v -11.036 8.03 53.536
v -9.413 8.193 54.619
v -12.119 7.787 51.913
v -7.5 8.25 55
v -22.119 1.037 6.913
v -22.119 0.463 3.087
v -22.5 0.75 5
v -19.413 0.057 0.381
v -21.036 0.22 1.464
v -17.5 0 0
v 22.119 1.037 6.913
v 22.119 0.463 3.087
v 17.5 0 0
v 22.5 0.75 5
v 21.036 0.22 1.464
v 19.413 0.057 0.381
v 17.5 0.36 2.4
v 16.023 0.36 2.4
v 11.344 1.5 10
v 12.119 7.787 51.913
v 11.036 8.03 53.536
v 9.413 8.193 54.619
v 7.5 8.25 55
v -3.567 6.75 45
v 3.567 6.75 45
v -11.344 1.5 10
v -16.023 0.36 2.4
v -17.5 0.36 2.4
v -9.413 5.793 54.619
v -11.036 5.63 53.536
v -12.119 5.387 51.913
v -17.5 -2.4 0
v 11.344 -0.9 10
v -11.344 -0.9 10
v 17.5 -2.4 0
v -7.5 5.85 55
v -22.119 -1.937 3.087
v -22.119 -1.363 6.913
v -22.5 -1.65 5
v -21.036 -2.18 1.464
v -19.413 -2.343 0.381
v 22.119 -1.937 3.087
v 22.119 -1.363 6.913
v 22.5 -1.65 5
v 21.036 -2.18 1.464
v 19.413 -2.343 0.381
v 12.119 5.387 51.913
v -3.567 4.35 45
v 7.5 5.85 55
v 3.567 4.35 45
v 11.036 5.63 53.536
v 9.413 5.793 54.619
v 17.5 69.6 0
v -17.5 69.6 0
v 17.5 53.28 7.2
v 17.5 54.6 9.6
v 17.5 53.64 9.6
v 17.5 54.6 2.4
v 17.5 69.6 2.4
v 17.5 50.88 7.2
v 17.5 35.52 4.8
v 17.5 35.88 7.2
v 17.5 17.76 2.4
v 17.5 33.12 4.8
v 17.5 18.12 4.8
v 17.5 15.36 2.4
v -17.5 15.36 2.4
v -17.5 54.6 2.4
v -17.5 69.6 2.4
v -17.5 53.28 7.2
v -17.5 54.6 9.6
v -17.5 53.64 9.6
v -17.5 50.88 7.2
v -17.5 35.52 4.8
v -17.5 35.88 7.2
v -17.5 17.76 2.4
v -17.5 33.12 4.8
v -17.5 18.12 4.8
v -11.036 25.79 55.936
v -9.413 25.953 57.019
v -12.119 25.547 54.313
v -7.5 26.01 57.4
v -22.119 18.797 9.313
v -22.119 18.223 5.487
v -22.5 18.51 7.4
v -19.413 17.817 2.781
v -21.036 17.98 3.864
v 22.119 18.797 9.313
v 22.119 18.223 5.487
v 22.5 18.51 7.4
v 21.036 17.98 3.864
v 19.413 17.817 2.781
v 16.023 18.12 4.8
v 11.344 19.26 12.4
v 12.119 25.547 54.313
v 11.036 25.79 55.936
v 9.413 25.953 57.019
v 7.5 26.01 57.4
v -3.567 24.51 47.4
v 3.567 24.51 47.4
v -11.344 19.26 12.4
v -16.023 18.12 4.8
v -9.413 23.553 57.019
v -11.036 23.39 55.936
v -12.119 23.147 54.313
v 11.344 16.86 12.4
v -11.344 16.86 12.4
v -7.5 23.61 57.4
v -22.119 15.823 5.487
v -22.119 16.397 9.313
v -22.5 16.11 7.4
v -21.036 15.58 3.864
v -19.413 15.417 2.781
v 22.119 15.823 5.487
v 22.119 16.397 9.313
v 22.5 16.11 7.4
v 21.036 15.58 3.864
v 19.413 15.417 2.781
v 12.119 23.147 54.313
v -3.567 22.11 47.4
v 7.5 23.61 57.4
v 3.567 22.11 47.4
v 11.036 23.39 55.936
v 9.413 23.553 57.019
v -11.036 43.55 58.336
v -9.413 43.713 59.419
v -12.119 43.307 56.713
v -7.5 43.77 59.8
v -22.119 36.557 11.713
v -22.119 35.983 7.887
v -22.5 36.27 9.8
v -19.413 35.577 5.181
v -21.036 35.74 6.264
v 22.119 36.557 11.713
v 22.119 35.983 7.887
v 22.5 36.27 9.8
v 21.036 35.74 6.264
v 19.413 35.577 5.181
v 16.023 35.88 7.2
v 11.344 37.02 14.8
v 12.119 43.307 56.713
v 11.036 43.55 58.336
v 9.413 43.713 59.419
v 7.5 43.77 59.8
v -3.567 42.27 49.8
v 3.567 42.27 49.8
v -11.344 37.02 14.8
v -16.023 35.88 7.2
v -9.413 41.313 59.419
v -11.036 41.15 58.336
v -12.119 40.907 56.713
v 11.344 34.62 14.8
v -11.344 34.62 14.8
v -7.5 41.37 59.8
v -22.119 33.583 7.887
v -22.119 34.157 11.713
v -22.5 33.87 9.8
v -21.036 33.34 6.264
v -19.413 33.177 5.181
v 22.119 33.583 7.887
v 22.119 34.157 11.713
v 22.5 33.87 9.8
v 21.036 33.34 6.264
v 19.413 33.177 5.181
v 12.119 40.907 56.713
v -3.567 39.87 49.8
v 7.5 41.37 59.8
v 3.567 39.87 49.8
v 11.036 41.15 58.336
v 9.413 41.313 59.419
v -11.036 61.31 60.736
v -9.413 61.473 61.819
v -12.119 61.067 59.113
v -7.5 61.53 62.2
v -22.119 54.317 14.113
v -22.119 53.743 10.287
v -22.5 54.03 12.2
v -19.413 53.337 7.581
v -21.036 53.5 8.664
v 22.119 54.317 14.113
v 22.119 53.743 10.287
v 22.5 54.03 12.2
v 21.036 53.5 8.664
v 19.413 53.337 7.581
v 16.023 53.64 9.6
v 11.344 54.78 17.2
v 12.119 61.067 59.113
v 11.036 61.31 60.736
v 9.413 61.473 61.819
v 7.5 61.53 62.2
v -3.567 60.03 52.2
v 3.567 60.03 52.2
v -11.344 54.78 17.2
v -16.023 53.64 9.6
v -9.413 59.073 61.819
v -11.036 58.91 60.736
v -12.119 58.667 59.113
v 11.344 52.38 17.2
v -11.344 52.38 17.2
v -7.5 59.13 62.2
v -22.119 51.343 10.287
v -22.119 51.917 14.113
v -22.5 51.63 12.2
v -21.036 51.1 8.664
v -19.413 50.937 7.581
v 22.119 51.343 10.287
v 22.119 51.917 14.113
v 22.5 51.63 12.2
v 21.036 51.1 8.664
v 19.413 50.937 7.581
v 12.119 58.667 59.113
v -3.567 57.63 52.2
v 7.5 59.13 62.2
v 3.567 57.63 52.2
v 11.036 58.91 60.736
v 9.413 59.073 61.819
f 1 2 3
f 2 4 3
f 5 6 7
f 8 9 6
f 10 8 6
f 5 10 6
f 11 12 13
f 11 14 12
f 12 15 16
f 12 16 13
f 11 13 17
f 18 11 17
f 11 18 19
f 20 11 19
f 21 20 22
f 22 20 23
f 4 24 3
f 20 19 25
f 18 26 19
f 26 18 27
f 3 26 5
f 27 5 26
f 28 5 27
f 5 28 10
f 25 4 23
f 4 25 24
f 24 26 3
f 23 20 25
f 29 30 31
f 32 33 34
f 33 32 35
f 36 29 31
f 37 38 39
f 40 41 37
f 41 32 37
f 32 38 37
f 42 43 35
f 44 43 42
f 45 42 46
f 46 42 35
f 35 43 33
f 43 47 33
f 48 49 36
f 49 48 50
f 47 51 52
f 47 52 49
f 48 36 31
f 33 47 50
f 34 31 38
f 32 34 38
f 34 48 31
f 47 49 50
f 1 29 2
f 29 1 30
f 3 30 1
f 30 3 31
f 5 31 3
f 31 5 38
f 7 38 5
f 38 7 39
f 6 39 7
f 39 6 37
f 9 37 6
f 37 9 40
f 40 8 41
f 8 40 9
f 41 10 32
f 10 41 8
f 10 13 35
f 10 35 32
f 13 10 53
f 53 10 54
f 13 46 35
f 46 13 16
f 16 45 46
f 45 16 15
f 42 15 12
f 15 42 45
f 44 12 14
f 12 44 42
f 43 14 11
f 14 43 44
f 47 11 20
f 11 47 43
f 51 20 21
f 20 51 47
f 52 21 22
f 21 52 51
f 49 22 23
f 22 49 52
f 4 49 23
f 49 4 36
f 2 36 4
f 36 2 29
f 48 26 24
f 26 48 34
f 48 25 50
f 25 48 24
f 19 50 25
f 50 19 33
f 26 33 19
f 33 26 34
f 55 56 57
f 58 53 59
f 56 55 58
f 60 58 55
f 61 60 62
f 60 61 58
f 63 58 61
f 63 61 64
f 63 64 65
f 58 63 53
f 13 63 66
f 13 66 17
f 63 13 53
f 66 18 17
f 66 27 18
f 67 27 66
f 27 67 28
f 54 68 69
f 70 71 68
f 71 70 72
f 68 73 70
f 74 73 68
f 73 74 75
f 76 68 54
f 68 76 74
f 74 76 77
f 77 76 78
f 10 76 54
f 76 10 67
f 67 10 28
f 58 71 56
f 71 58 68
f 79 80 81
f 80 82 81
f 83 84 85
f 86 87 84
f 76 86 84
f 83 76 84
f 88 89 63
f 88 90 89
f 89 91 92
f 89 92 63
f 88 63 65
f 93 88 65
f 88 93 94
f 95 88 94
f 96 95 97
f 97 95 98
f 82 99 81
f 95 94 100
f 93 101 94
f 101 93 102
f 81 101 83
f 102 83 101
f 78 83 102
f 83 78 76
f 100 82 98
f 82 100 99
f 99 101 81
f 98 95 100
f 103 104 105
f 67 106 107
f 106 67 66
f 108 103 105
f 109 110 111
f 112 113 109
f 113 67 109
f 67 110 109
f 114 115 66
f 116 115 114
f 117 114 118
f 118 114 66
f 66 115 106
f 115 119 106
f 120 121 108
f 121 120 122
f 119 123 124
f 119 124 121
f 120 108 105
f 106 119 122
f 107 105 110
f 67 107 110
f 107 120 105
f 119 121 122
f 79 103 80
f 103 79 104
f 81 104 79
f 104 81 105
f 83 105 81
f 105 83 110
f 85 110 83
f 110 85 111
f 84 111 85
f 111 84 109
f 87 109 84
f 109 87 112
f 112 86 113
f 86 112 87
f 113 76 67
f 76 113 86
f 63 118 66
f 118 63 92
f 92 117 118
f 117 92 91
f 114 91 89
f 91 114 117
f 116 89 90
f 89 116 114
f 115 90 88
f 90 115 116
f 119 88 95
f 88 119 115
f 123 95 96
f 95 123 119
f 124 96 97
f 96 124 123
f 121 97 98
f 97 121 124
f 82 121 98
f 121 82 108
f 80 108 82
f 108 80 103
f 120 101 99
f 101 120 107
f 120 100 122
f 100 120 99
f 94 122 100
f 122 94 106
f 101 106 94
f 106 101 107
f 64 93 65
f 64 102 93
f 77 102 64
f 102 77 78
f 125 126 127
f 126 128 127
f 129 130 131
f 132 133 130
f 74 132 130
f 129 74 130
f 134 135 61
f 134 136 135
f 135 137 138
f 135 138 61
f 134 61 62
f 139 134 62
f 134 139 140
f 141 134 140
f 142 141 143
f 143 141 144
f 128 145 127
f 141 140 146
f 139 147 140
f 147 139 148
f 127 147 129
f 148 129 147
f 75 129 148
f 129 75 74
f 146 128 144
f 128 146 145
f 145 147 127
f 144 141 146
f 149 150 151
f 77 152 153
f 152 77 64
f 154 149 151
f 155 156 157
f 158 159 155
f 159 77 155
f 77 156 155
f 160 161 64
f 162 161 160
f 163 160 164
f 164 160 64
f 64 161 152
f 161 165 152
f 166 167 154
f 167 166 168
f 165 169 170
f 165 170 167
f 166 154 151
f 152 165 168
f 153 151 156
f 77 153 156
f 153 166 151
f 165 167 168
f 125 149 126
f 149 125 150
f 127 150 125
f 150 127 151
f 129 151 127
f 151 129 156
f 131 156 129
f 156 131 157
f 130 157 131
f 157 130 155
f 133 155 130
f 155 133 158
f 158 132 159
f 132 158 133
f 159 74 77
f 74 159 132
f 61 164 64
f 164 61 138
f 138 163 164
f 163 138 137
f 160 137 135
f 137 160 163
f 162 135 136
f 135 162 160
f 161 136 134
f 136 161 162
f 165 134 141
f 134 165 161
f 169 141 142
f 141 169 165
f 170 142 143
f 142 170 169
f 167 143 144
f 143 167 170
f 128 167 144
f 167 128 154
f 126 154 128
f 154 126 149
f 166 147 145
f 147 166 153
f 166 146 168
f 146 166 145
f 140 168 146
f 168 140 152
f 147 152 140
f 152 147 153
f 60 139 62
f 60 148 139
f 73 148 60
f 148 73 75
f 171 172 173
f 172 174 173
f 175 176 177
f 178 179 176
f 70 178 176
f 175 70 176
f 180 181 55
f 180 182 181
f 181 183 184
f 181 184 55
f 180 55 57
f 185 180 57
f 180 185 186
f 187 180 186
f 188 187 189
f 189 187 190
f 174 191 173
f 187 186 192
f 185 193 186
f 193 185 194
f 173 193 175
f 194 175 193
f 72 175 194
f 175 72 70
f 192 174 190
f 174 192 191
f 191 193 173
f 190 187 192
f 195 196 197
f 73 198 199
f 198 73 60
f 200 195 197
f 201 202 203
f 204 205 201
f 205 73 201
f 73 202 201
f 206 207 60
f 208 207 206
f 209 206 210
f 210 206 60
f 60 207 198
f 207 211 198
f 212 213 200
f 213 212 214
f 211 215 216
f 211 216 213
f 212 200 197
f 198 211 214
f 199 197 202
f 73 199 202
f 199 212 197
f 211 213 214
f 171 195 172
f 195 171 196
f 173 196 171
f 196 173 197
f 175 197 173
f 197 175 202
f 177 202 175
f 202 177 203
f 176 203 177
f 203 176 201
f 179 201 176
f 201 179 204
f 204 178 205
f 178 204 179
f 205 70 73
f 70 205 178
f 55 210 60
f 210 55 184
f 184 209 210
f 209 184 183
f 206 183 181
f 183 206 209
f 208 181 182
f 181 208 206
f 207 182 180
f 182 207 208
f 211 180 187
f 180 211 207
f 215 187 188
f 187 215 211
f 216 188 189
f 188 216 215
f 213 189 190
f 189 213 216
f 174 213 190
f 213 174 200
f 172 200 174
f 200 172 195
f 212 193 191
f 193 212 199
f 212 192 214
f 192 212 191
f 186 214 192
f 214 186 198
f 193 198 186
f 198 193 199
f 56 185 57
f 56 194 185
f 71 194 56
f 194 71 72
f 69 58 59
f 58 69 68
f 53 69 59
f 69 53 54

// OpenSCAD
// Tool Holder
// Adrian McCarthy 2022-12-05

// Holds side cutters, needle nose pliers, and similar tools.


module tool_holder(th=2.4) {
    r = 5;
    h = 55;
    w = 35;
    dx0 = w/2;
    dx1 = 3/7*w/2;
    dy = 15 + th;
    dz = th;
    z0 = r;
    z1 = h - r;
    slots = 3;
    
    module skew(amt=0.15) {
        multmatrix([[1, 0, 0, 0],
                [0, 1, amt, 0],
                [0, 0, 1, 0]]) children();
    }

    module divider() {
        linear_extrude(th) {
            hull() {
                translate([-dx0, z0]) circle(r);
                translate([-dx1, z1]) circle(r);
            }
            hull() {
                translate([-dx1, z1]) circle(r);
                translate([ dx1, z1]) circle(r);
            }
            hull() {
                translate([ dx1, z1]) circle(r);
                translate([ dx0, z0]) circle(r);
            }
            hull() {
                translate([ dx0, z0]) circle(r);
                translate([-dx0, z0]) circle(r);
            }
        }
    }
    
    for (i = [0:slots]) {
        skew()
            translate([0, dy*i, dz*i])
                rotate([90, 0, 0])
                    divider();
        translate([-w/2, dy*i, dz*i])
            cube([w, (slots-i)*dy + th, th]);
    }
    translate([-w/2, slots*dy, 0])
        cube([w, dy, th]);

}

tool_holder();
